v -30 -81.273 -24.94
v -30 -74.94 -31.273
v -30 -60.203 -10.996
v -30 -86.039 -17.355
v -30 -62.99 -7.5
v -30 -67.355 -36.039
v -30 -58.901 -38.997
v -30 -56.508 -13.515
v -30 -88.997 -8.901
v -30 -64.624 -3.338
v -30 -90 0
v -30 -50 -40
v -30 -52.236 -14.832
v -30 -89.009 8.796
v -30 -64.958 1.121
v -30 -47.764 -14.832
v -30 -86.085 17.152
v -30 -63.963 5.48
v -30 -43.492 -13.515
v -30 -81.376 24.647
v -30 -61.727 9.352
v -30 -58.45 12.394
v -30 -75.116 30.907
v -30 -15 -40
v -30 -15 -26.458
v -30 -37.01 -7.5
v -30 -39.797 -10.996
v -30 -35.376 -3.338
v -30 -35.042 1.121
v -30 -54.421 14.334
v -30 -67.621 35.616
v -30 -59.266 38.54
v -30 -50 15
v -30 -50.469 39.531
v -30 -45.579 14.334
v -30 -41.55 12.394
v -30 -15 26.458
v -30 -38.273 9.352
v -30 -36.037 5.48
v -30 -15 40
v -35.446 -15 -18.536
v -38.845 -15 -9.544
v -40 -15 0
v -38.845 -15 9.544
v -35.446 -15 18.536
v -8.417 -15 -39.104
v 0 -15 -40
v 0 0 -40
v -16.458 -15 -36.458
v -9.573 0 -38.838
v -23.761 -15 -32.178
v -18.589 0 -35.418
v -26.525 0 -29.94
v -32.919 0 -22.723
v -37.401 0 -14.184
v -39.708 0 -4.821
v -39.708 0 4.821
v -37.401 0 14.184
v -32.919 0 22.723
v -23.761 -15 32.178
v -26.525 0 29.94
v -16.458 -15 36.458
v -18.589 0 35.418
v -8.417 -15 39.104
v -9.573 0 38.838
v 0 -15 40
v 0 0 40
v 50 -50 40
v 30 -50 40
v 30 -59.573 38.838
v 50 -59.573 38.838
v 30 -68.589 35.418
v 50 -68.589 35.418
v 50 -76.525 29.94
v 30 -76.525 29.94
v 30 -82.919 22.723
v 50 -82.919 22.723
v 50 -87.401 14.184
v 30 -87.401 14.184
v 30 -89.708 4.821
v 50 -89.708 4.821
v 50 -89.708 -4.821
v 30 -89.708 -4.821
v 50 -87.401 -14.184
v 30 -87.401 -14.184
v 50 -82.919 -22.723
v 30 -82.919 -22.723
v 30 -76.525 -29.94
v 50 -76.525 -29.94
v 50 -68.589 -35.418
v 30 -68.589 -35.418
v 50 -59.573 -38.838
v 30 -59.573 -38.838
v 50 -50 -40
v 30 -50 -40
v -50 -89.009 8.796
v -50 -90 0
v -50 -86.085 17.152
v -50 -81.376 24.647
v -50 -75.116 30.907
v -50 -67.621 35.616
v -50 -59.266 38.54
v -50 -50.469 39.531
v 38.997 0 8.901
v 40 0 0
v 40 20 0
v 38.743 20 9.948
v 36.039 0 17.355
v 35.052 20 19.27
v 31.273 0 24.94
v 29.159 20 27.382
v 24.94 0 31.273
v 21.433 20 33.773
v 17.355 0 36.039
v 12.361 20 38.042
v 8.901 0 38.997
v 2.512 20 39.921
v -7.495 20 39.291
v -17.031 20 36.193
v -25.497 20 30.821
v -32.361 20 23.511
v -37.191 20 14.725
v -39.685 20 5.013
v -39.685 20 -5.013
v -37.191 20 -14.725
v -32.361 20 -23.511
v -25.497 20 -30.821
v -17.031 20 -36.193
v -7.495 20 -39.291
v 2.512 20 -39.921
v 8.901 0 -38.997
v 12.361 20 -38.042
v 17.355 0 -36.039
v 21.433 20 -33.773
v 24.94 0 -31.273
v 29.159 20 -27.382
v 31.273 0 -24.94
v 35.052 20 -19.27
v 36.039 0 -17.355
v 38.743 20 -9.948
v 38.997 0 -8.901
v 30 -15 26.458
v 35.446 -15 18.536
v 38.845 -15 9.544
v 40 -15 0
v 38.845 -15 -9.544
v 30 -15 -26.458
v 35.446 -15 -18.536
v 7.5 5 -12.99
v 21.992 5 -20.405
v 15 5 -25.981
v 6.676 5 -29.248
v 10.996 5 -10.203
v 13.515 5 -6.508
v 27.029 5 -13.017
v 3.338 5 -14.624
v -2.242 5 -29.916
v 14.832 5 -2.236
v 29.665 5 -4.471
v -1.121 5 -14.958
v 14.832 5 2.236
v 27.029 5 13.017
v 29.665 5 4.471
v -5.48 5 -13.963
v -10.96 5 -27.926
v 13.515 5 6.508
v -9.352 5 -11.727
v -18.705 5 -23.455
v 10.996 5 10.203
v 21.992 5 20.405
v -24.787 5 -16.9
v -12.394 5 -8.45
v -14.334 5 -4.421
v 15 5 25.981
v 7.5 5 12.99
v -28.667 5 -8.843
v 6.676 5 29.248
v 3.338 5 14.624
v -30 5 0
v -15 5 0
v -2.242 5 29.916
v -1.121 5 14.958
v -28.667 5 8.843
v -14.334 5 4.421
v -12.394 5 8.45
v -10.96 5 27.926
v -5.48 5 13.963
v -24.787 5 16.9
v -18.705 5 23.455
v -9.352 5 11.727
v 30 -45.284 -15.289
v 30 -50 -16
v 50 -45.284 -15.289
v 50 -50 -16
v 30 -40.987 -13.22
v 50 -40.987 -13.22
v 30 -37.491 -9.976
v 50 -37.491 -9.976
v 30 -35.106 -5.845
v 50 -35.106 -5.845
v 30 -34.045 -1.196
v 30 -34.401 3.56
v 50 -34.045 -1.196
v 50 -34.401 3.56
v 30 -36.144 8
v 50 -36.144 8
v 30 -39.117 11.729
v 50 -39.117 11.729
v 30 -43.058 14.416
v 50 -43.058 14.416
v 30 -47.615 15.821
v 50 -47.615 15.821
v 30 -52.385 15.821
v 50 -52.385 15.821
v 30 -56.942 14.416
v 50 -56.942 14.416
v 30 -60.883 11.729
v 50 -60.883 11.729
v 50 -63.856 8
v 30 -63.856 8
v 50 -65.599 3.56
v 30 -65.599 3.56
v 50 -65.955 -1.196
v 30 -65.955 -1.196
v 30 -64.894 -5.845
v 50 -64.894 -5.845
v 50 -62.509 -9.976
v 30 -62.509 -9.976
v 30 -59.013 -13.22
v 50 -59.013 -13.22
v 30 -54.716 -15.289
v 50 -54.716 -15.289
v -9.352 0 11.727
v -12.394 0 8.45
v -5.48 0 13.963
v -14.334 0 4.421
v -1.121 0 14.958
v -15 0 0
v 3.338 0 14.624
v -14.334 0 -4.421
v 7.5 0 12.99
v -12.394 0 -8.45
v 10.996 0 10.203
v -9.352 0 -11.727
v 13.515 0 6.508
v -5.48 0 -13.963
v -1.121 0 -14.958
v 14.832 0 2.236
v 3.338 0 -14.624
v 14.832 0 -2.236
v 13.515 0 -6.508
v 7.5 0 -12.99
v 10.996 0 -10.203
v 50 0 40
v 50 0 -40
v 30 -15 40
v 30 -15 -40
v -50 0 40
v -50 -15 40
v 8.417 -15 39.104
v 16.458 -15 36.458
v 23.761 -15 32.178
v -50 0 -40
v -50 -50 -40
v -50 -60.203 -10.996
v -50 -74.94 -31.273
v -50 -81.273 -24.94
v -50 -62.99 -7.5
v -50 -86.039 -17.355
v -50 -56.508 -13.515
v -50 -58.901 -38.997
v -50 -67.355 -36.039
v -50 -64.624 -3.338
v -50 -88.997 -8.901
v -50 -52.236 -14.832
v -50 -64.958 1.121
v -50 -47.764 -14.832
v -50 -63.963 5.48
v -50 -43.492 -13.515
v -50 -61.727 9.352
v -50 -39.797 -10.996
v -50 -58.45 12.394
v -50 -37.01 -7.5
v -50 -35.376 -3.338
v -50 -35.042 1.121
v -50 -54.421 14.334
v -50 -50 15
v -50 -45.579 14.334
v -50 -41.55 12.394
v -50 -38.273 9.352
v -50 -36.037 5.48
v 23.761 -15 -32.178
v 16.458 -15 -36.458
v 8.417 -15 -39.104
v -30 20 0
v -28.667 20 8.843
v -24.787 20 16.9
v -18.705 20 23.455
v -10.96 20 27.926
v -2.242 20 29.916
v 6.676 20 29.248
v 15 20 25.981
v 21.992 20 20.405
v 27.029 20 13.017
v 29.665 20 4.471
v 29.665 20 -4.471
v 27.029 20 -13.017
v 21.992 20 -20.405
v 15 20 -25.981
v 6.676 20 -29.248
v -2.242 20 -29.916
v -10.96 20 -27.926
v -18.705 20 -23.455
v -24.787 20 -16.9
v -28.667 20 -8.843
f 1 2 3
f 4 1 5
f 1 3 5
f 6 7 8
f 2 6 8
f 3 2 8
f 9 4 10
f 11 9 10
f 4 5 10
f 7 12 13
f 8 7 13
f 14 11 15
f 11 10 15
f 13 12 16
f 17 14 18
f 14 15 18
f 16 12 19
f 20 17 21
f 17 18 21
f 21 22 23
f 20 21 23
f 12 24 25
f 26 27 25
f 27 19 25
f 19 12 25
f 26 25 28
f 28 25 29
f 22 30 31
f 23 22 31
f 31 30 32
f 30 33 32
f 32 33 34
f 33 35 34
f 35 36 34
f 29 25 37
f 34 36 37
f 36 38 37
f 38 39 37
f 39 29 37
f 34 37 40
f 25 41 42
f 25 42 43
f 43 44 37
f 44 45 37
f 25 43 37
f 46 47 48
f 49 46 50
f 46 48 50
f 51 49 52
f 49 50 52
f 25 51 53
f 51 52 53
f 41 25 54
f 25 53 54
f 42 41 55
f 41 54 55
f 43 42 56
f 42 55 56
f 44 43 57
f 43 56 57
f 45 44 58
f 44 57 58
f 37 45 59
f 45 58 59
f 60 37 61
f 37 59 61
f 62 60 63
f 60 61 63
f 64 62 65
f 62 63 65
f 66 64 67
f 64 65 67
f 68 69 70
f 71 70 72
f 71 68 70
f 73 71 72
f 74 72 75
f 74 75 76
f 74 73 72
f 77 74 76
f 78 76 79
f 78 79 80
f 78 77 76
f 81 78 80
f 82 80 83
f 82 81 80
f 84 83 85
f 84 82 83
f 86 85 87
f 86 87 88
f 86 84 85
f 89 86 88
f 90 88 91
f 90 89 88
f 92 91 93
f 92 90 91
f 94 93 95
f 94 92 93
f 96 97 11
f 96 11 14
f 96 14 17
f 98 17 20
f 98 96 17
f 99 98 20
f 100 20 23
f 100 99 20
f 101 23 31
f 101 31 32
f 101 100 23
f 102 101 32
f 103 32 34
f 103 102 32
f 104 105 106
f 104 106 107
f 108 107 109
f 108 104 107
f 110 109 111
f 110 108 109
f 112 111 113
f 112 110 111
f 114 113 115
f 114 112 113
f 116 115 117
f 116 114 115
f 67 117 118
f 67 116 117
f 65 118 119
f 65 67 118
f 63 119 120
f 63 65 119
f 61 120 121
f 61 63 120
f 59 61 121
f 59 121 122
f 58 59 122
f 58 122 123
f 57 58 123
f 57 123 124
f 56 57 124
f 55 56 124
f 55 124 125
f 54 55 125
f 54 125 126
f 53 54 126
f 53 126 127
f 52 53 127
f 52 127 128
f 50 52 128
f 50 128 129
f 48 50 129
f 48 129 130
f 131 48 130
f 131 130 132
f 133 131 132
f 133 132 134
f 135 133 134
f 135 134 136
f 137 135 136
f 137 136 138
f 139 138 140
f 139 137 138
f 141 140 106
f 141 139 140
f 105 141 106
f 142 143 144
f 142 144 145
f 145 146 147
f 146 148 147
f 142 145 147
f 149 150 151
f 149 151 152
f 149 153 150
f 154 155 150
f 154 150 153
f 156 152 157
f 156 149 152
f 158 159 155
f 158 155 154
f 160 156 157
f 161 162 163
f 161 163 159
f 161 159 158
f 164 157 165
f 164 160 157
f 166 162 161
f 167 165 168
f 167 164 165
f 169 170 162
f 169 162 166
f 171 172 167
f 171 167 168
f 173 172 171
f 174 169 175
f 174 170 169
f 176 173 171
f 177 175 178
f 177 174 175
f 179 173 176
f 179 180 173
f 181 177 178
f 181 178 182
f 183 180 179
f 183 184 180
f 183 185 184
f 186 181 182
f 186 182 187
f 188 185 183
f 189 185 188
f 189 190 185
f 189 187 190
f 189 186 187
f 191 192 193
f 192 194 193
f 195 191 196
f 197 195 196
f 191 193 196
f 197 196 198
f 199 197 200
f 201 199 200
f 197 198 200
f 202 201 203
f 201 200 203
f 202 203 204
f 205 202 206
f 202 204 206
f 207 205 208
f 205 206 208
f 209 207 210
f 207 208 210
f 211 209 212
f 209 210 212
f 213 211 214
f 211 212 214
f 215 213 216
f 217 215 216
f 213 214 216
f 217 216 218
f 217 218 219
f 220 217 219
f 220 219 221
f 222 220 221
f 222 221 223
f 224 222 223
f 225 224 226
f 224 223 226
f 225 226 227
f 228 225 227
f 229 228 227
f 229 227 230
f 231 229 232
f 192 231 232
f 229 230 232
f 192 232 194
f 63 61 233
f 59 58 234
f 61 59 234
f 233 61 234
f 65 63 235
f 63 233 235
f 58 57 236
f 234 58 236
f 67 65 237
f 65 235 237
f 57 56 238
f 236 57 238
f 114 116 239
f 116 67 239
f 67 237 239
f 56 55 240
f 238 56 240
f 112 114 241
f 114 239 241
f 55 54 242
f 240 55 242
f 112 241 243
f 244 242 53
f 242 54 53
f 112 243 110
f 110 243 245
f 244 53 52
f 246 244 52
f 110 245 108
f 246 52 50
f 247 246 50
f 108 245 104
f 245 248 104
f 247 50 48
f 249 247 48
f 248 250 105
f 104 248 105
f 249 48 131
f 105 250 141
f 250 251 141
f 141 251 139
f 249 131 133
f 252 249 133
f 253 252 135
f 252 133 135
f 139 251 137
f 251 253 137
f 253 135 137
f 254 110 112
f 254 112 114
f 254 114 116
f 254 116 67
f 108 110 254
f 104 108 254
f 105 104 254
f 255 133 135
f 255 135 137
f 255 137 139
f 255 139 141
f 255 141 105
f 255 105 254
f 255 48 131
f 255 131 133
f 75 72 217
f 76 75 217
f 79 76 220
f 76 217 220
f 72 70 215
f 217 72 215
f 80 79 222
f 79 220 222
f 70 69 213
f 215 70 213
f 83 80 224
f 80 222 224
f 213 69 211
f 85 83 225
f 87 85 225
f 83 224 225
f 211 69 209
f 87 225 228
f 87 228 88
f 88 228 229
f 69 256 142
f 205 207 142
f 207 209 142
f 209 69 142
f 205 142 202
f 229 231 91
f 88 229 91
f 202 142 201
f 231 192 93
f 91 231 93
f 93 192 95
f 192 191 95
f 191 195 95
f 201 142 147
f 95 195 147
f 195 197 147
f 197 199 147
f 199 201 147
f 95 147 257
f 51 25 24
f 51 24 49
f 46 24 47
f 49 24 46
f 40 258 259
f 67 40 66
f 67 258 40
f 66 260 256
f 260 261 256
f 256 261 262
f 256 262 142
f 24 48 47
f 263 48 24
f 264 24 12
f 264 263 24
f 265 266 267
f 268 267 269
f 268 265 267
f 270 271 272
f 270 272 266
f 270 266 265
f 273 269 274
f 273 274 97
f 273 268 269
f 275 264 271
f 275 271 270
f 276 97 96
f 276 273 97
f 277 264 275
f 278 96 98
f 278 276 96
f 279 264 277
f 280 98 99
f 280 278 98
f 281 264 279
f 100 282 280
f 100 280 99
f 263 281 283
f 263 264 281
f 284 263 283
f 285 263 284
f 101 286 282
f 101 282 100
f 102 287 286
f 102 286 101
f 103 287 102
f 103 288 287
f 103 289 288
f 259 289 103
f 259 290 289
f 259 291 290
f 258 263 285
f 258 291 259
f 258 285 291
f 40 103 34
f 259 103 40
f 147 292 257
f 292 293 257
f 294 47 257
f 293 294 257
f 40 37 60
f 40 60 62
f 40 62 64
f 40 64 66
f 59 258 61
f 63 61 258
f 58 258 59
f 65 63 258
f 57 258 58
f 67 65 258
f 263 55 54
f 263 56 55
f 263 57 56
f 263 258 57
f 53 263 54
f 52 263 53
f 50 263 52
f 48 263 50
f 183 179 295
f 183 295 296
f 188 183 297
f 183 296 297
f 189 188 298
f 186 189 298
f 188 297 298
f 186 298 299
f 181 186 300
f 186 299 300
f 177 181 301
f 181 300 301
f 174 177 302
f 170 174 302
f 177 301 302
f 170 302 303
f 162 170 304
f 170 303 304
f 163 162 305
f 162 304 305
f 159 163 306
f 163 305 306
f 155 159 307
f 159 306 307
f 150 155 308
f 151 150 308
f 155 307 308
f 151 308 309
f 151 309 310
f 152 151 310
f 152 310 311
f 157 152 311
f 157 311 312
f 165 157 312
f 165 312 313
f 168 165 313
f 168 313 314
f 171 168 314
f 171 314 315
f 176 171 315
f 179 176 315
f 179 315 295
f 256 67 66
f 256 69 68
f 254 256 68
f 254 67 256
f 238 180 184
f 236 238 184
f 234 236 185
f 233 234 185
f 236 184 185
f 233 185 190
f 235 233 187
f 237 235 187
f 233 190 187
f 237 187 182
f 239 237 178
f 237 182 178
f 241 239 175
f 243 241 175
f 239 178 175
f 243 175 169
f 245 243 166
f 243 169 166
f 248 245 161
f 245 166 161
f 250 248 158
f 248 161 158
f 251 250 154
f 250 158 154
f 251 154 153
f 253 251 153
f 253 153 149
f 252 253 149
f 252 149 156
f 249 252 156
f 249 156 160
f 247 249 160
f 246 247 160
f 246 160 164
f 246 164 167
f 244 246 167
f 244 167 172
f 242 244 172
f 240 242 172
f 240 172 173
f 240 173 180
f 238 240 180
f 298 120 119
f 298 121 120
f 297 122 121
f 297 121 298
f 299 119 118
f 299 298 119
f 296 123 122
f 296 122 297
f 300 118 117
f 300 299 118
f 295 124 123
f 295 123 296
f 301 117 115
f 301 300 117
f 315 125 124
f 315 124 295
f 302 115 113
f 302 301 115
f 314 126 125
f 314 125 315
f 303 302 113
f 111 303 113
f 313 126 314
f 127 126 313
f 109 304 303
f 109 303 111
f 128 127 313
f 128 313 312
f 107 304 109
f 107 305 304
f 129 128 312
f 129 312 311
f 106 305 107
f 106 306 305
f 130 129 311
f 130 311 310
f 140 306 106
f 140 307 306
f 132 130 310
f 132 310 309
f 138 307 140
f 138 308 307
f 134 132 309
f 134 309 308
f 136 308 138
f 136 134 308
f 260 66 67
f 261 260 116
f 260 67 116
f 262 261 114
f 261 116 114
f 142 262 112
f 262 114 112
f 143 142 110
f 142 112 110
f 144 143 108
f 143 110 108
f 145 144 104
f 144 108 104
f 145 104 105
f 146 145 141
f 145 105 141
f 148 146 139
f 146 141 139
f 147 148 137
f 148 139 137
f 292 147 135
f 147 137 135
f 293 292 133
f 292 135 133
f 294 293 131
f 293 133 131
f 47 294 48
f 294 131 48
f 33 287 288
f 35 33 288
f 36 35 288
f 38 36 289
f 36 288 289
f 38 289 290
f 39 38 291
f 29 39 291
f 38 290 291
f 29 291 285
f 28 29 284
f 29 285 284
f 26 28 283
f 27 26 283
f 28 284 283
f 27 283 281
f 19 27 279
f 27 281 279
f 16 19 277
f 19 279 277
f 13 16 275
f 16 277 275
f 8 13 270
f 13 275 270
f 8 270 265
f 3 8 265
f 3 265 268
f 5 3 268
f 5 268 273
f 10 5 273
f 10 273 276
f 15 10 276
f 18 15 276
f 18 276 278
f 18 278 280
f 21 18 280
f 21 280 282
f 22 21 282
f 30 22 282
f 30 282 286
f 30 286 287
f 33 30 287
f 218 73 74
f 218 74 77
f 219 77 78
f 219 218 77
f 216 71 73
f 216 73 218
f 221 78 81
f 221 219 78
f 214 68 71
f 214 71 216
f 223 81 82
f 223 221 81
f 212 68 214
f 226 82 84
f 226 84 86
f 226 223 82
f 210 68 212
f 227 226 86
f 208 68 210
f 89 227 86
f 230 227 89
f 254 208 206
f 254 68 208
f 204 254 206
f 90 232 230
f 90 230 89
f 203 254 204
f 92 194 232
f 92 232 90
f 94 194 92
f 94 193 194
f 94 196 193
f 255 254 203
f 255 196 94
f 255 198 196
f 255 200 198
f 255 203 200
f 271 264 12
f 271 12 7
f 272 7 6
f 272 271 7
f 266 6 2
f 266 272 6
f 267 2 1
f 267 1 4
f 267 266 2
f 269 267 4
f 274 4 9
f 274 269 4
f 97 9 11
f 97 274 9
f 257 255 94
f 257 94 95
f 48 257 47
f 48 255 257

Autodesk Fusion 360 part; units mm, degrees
sketch "Sketch1" plane through (0, 0, 0) normal (0, 1, 0) x (1, 0, 0)
  line L0 (50, 40) -> (-50, 40)
  line L1 (-50, 40) -> (-50, -40)
  line L2 (-50, -40) -> (50, -40)
  line L3 (50, -40) -> (50, 40)
  line L4 (50, 40) -> (-50, -40) construction
  line L5 (-50, 40) -> (50, -40) construction
  circle A0 centre (0, 0) radius 40
  dimension "d1" = 100
  dimension "d2" = 80
extrude "Extrude1" add sketch "Sketch1" against normal blind 15 contours L0 L2 L3 A0 | L0 L1 L2 A0 makes body 1 at (-3.9827, -10, 39.8012)
extrude "Extrude2" add sketch "Sketch1" along normal blind 20 separate body contours A0 makes body 2
sketch "Sketch2" plane through (0, 20, 0) normal (0, 1, 0) x (-1, 0, 0)
  circle A0 centre (0, 0) radius 40
  circle A1 centre (0, 0) radius 30
  dimension "d7" = 60
extrude "Extrude3" cut sketch "Sketch2" against normal blind 15 contours A1 bodies 2
sketch "Sketch3" plane through (0, 5, 0) normal (0, 1, 0) x (-1, 0, 0)
  circle A0 centre (0, 0) radius 30
  circle A1 centre (0, 0) radius 15
  dimension "d10" = 30
extrude "Extrude4" cut sketch "Sketch3" against normal blind 20 contours A1 bodies 2
sketch "Sketch4" plane through (50, 0, 0) normal (1, 0, 0) x (0, 0, -1)
  line L0 (40, 0) -> (-40, 0)
  line L1 (-40, 0) -> (-40, -15)
  line L2 (-40, -15) -> (40, -15)
  line L3 (40, -15) -> (40, 0)
  line L4 (40, -15) -> (40, -50)
  line L5 (-40, -50) -> (-40, -15)
  circle A0 centre (0, -50) radius 16
  arc A1 (-40, -50) -> (40, -50) centre (0, -50) ccw
  line L6 (-40, -15) -> (40, -15)
  dimension "d14" = 80
  dimension "d15" = 32
  dimension "d16" = 50
extrude "Extrude5" add sketch "Sketch4" against normal blind 20 separate body contours L2 L4 L5 A1 L6 makes body 3
sketch "Sketch5" plane through (-50, 0, 0) normal (-1, 0, 0) x (0, 0, 1)
  line L0 (40, 0) -> (-40, 0)
  line L1 (-40, 0) -> (-40, -15)
  line L2 (-40, -15) -> (40, -15)
  line L3 (40, -15) -> (40, 0)
  line L4 (-40, -15) -> (40, -15)
  line L5 (-40, -15) -> (-40, -50)
  arc A0 (-40, -50) -> (0, -90) centre (0, -50) ccw
  arc A1 (0, -90) -> (39.5309, -50.4691) centre (0, -50.4691) ccw
  line L6 (39.5309, -50.4691) -> (40, -15)
  circle A2 centre (0, -50) radius 15
  dimension "d19" = 30
extrude "Extrude6" add sketch "Sketch5" against normal blind 20 separate body contours L2 L4 L5 A0 A1 L6 makes body 4
combine "Combine1" operation add target body 4 tool bodies 1 3 2
